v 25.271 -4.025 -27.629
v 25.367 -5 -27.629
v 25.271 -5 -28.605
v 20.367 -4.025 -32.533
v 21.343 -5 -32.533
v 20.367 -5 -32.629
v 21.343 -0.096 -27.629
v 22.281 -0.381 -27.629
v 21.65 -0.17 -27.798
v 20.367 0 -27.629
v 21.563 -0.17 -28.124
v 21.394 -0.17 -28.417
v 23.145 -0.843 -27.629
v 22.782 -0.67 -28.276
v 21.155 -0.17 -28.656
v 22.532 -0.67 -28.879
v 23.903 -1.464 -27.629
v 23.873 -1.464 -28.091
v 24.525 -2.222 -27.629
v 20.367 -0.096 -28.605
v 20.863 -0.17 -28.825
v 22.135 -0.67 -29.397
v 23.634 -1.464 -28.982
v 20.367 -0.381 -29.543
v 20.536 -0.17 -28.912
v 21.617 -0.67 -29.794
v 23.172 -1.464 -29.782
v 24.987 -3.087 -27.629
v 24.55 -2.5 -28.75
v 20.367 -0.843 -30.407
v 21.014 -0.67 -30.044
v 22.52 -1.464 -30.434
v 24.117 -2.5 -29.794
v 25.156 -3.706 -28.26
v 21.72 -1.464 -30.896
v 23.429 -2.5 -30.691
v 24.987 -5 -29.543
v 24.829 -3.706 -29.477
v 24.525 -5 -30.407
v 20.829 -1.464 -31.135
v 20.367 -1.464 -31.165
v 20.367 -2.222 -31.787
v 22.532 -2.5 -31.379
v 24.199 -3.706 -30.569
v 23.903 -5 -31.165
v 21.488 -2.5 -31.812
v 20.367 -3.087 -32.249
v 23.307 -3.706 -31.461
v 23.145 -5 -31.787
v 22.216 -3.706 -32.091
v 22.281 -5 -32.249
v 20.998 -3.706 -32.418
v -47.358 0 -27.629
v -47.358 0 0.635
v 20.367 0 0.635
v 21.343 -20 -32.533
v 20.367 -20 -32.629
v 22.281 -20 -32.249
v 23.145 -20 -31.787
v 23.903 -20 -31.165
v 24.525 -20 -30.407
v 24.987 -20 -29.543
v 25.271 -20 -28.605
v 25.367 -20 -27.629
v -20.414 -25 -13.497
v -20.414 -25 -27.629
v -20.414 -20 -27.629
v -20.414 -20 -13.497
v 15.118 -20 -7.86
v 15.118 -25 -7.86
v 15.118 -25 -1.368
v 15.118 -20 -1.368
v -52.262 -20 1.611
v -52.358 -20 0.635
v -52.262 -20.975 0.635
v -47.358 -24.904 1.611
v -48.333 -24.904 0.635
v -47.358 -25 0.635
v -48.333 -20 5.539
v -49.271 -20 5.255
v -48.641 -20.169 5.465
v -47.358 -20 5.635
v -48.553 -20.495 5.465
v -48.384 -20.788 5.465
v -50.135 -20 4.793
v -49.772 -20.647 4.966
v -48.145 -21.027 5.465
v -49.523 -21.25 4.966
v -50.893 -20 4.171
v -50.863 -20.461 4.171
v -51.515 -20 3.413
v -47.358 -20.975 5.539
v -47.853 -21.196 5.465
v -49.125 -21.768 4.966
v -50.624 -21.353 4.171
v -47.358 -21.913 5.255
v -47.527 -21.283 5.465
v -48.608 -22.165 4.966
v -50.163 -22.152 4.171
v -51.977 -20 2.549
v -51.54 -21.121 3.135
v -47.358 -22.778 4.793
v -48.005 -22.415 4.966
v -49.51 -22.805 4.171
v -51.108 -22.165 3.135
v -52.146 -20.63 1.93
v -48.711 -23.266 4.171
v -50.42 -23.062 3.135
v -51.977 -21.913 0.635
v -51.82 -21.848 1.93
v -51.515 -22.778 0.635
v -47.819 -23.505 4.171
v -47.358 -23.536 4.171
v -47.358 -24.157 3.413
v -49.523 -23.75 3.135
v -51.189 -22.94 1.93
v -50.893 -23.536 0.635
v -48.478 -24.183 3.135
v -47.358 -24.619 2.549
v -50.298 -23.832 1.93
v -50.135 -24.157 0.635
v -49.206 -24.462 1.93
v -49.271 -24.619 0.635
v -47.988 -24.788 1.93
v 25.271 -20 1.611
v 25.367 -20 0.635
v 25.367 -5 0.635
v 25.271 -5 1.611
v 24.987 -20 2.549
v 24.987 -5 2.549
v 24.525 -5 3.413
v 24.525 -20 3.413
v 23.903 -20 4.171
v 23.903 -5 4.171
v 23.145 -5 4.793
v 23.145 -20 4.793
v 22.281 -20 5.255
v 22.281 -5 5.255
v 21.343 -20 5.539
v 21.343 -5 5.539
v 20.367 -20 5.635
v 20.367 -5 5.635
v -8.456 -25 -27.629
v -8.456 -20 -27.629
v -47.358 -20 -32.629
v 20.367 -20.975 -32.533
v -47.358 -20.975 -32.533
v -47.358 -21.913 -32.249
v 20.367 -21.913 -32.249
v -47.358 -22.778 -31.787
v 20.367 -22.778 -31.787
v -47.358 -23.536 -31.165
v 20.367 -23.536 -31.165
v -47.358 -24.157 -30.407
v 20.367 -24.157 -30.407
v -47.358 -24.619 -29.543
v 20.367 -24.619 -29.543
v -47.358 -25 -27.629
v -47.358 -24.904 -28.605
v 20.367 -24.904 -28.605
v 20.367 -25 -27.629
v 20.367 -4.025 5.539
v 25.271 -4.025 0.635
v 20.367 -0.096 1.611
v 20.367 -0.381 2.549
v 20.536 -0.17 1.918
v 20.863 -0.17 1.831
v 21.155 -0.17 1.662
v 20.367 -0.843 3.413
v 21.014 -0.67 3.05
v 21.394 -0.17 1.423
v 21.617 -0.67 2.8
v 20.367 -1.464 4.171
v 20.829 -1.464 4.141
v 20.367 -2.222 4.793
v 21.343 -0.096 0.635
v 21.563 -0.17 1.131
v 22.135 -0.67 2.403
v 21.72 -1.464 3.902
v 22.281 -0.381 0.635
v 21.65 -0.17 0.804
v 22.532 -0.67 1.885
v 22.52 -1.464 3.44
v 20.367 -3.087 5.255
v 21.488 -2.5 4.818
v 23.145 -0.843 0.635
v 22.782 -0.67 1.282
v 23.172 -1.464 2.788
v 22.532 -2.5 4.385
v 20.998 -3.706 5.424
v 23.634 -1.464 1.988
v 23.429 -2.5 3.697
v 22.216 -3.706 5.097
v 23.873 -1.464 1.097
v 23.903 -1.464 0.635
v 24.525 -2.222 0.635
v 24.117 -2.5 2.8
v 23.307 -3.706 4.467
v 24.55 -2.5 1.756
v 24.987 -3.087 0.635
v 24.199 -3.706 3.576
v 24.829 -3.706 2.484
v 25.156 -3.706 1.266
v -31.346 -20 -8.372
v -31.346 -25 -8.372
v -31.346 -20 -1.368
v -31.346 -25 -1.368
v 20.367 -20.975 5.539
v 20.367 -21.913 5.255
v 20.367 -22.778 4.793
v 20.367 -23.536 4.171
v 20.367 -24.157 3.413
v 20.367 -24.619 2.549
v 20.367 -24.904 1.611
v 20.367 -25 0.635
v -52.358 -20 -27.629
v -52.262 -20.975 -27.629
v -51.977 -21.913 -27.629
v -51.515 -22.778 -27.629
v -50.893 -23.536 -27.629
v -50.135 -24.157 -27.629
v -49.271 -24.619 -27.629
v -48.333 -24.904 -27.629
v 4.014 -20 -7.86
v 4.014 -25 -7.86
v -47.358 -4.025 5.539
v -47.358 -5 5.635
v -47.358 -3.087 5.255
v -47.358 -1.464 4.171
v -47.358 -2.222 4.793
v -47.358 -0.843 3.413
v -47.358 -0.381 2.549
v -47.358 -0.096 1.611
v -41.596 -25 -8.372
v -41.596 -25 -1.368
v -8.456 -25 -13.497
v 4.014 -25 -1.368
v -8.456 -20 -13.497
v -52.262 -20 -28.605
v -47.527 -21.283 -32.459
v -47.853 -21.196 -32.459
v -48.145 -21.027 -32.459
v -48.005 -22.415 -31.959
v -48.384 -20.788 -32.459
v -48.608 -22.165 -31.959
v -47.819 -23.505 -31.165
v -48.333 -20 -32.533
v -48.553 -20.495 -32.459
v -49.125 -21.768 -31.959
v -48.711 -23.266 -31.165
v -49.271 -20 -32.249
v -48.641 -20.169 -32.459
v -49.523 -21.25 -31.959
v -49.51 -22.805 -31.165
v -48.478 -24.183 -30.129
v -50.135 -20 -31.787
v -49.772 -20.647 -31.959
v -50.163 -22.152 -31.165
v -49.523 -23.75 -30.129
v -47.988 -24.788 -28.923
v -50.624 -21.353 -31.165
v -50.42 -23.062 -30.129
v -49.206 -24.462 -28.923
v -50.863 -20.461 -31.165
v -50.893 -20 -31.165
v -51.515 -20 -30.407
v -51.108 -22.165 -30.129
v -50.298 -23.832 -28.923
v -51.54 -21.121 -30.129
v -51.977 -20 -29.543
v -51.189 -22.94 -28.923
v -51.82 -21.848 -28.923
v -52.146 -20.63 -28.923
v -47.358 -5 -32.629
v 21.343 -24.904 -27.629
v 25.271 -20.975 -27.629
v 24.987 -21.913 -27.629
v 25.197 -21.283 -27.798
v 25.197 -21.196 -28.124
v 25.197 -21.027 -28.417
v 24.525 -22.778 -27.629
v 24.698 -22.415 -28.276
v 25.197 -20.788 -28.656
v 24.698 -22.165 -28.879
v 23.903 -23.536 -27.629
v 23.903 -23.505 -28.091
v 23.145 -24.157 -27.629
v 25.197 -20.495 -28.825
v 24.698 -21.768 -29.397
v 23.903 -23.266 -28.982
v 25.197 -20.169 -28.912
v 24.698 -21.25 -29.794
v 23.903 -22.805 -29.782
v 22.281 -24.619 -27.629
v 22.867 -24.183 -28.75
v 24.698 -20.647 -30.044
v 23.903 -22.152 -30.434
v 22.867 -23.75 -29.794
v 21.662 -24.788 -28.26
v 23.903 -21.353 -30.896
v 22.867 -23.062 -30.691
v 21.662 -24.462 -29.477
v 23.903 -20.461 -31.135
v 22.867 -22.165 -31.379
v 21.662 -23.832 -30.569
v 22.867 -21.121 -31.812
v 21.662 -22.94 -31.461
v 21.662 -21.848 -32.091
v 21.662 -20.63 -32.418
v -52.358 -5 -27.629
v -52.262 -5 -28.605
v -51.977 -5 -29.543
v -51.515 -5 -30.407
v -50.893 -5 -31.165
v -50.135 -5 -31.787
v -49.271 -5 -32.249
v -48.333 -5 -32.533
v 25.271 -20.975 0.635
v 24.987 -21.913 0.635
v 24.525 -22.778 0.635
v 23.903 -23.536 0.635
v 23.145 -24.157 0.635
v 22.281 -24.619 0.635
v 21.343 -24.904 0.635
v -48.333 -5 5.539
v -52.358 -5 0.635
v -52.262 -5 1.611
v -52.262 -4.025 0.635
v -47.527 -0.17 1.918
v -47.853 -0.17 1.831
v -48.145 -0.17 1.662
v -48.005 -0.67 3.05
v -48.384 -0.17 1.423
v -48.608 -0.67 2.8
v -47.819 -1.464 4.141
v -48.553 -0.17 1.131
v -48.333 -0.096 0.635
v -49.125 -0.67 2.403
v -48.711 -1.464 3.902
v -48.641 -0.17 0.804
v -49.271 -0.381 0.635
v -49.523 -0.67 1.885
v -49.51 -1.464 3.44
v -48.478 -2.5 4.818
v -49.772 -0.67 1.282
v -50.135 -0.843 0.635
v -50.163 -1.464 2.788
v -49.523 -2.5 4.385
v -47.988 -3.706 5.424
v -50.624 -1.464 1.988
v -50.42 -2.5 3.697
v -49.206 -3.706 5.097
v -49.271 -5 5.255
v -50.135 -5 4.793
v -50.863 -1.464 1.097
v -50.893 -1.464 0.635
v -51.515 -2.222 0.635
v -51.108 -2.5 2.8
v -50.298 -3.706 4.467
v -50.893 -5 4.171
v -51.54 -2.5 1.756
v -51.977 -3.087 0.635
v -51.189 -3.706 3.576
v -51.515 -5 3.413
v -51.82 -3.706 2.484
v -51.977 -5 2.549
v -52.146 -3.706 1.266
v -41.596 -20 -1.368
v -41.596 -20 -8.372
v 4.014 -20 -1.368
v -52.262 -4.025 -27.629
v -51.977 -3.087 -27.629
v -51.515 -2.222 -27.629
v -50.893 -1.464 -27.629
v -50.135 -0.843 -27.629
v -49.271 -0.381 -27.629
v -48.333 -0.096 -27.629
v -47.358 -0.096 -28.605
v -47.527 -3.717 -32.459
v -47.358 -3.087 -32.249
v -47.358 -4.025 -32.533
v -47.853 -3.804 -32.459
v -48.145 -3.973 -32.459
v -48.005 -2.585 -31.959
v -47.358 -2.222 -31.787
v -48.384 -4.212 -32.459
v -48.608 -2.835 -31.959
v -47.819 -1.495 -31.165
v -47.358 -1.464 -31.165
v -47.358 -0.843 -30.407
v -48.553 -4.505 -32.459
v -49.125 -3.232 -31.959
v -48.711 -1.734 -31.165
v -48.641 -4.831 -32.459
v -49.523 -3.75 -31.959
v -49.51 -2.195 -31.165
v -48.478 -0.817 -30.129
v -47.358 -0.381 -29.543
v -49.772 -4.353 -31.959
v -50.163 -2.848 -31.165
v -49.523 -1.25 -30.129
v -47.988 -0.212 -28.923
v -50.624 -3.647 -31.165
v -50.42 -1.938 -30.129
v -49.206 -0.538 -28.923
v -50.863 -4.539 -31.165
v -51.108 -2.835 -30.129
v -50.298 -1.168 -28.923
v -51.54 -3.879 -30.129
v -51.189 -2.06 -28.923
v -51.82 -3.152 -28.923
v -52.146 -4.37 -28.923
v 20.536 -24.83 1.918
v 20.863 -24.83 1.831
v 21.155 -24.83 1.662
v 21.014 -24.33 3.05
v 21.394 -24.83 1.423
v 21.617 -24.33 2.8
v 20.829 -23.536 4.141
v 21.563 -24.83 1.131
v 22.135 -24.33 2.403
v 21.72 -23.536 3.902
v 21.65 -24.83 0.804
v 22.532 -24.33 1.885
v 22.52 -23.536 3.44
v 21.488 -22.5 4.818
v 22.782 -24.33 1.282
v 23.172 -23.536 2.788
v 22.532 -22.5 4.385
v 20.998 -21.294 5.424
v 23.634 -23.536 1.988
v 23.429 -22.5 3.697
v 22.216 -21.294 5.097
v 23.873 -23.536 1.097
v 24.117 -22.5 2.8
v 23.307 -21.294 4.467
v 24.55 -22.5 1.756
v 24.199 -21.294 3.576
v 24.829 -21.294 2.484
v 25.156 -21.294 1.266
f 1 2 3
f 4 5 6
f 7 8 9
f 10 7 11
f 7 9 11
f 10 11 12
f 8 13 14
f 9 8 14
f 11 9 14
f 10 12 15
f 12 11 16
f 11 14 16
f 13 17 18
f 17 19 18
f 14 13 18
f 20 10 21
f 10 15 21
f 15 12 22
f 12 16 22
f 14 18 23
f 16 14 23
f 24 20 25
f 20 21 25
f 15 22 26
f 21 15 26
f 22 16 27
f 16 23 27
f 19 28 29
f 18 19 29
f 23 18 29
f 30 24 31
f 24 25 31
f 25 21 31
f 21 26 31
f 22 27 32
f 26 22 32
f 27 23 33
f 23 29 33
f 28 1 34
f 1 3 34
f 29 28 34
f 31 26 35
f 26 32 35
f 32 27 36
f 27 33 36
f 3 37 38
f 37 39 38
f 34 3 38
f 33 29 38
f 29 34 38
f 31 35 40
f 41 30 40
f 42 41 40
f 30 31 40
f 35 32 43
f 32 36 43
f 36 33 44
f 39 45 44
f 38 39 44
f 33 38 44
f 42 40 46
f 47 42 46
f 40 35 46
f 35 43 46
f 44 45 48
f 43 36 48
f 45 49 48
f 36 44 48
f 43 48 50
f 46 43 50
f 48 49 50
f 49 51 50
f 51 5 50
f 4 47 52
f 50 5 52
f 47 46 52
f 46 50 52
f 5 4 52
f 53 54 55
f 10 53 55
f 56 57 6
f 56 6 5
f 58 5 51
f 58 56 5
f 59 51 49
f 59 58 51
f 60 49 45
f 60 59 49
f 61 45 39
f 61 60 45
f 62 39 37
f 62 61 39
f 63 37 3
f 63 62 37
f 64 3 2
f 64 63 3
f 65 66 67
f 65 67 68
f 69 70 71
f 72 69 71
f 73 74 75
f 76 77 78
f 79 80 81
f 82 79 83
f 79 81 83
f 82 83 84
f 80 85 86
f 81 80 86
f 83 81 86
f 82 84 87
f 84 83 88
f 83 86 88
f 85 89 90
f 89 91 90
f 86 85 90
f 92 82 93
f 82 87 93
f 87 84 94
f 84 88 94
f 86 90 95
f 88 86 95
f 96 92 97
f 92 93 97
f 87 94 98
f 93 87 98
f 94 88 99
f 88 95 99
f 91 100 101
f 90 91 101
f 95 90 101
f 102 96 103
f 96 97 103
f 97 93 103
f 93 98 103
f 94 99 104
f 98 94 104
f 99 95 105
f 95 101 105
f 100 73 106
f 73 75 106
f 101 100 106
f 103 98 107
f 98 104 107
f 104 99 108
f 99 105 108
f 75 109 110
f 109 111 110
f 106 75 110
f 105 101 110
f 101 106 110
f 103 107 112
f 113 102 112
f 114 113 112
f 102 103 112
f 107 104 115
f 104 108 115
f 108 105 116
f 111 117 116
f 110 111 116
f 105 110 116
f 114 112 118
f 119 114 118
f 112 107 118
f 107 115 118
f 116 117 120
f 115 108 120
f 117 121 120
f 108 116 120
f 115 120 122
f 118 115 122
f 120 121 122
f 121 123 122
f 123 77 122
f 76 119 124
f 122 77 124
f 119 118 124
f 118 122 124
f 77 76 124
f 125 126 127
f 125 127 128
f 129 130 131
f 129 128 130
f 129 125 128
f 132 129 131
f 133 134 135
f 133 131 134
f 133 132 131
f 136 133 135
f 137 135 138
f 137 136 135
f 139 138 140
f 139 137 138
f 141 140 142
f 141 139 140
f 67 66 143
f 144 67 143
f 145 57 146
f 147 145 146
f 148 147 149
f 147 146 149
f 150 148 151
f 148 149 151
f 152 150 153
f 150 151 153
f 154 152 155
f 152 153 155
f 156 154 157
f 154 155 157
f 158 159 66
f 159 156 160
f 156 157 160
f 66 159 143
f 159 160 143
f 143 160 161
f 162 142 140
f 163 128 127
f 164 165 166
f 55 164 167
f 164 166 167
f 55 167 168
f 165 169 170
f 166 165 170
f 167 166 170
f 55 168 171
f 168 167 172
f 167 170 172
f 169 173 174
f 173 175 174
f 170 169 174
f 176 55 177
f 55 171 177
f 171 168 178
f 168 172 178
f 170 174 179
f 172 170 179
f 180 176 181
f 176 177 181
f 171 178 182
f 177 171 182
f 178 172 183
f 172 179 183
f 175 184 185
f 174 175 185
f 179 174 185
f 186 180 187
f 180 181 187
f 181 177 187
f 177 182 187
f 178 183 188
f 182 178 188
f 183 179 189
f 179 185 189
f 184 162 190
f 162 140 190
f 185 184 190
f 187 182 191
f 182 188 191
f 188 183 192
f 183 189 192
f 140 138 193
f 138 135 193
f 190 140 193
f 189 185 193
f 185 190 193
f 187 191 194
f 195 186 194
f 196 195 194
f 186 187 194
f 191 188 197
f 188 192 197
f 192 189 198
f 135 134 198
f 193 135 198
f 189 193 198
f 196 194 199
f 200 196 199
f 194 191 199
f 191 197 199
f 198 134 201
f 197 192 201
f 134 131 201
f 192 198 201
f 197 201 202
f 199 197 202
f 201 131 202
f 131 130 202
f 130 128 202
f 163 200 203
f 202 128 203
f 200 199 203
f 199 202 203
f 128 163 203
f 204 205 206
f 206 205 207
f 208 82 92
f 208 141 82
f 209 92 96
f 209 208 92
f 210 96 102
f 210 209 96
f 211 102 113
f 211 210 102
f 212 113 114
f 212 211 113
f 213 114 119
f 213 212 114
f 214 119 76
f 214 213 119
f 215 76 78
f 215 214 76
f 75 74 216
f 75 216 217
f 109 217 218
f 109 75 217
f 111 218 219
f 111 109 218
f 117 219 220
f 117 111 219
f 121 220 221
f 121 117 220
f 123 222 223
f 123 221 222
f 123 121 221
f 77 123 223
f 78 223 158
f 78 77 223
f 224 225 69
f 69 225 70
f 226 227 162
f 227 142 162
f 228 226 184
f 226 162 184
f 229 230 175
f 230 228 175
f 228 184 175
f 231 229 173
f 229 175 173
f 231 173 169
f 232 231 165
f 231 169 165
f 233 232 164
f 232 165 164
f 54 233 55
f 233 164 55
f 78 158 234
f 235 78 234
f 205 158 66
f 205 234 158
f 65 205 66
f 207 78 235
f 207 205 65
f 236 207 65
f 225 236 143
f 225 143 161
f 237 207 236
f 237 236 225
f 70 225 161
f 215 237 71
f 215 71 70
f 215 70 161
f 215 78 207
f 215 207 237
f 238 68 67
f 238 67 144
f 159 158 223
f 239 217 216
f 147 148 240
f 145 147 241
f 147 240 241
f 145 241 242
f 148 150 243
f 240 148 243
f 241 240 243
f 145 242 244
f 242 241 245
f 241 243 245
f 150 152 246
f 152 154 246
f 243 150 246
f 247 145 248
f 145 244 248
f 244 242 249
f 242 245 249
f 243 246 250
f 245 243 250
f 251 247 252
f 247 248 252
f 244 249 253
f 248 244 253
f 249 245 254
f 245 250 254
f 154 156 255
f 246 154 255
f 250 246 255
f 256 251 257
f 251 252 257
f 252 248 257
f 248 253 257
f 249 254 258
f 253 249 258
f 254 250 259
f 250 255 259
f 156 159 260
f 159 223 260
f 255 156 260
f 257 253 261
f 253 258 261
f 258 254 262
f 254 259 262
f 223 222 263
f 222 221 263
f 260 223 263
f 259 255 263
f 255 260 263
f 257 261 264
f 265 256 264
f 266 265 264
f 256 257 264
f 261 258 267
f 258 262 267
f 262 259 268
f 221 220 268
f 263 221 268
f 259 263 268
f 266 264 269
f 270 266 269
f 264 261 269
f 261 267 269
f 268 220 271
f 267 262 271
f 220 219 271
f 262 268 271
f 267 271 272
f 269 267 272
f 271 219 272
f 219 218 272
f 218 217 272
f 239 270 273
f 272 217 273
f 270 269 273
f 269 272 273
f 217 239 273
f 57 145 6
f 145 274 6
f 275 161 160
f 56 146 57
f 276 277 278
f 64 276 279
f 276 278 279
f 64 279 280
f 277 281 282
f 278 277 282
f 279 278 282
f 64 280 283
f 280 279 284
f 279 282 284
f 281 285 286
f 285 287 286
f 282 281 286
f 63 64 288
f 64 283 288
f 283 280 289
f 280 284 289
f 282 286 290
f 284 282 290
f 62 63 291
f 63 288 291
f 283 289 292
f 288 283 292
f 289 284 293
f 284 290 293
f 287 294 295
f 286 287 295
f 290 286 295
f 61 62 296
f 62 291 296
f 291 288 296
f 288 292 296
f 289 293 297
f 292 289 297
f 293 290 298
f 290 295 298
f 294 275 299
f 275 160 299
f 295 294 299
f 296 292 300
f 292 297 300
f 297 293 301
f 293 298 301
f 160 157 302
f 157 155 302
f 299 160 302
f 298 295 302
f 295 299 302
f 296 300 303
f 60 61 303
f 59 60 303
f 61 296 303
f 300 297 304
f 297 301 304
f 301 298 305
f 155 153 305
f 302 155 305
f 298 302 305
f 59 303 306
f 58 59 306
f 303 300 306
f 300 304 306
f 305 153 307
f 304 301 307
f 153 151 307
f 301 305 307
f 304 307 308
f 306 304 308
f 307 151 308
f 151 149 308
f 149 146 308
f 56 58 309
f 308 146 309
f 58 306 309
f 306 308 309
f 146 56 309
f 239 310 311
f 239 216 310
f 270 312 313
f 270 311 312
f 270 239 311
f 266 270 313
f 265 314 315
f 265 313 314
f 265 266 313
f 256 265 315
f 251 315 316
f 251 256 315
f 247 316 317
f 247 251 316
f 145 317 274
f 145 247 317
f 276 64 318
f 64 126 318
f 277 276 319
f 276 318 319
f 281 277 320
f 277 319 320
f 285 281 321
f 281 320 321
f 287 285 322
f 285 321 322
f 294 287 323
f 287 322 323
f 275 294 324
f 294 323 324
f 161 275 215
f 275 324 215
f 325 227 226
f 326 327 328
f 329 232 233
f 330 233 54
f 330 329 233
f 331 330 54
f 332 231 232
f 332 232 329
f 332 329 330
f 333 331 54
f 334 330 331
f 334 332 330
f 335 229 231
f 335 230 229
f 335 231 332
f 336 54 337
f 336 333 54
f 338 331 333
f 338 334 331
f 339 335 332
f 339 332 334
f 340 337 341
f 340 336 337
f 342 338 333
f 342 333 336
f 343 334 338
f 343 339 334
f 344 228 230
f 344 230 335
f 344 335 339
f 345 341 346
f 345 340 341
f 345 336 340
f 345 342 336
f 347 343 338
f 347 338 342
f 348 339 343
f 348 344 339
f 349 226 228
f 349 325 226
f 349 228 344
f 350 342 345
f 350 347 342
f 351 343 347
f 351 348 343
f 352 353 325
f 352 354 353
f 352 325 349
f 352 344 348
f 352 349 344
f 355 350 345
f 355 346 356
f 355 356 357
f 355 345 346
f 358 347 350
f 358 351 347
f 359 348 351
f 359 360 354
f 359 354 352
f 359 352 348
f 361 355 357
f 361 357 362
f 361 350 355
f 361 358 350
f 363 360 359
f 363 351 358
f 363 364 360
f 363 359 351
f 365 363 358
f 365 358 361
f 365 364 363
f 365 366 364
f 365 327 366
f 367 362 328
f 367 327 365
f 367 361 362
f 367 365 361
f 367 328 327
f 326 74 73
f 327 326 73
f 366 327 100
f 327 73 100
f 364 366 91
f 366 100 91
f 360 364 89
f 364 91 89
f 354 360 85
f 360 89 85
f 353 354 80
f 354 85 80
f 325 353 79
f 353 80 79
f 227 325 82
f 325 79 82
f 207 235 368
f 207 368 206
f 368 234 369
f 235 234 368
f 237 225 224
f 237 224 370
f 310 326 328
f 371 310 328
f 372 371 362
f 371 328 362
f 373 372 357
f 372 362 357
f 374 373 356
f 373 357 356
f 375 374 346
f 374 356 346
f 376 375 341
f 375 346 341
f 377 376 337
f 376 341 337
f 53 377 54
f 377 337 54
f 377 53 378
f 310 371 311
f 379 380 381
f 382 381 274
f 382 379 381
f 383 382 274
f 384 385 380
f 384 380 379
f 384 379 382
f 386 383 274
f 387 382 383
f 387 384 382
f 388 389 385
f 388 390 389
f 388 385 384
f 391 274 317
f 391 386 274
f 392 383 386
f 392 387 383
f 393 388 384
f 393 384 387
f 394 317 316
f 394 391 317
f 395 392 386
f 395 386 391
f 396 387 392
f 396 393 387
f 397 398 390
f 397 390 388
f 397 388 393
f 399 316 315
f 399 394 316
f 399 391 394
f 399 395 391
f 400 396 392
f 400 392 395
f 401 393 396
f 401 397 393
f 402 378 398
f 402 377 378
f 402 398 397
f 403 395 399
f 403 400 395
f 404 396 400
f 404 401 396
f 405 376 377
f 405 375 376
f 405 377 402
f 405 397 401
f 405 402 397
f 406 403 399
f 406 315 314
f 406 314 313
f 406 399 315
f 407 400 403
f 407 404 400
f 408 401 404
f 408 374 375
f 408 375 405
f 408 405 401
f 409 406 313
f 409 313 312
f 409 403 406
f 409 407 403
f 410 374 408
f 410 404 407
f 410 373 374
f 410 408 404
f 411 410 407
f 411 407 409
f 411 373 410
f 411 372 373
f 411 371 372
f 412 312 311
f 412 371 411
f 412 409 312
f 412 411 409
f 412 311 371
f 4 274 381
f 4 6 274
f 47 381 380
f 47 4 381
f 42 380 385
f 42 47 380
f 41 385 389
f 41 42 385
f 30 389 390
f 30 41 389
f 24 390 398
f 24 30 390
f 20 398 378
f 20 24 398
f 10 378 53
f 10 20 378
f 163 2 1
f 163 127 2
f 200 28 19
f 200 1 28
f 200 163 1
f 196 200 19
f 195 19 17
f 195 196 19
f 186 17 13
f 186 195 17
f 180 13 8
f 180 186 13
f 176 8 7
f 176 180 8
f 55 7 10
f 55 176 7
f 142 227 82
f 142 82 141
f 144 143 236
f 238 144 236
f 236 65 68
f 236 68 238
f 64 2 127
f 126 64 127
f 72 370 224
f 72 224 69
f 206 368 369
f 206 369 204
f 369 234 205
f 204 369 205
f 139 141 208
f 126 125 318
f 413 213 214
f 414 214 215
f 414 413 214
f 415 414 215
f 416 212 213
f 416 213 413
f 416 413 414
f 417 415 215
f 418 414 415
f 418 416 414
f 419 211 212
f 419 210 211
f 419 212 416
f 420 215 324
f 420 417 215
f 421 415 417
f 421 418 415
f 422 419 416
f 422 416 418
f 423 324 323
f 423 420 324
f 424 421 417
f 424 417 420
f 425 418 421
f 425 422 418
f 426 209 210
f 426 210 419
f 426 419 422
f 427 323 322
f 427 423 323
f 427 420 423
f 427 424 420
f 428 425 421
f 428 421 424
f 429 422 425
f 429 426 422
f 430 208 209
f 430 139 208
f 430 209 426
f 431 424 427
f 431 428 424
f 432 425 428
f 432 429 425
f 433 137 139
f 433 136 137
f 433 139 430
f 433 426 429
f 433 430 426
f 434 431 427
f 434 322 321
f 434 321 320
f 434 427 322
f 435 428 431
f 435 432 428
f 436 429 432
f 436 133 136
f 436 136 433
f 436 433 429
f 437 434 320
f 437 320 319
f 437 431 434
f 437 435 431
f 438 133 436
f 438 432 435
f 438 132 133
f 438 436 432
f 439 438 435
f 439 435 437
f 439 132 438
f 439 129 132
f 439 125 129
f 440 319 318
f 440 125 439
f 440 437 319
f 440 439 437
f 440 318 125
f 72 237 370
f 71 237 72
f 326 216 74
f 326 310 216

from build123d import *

# Parameters (mm, degrees)
F0_W     = 77.725055
F0_H     = 38.264645
F1_DEPTH = 25
F2_R     = 5
F3_W     = 10.249458
F3_H     = 7.003797
F3_W_2   = 11.10358
F3_H_2   = 6.491324
F3_W_3   = 11.957702
F3_H_3   = 14.132324
F4_DEPTH = 5


with BuildPart() as f1:
    # F0 (on Front) → F1 (new body)
    with BuildSketch(Plane.XZ):
        with Locations((-13.49512, -13.496899)):
            Rectangle(F0_W, F0_H)
    extrude(amount=F1_DEPTH)

    # F2
    f2_edges = [f1.edges().sort_by_distance(p)[0] for p in [
        (-52.357648, -25, -13.496899),
        (25.367407, -12.5, 5.635423),
        (-52.357648, -12.5, 5.635423),
        (-13.49512, 0, 5.635423),
        (-13.49512, -25, 5.635423),
        (-13.49512, -25, -32.629222),
        (25.367407, -25, -13.496899),
        (25.367407, -12.5, -32.629222),
        (25.367407, 0, -13.496899),
        (-52.357648, 0, -13.496899),
        (-13.49512, 0, -32.629222),
        (-52.357648, -12.5, -32.629222),
    ]]
    fillet(f2_edges, radius=F2_R)

    # F3 (on face) → F4 (cut)
    with BuildSketch(Plane.XZ.offset(25)):
        with Locations((-36.470987, -4.870271)):
            Rectangle(F3_W, F3_H)
        with Locations((9.566161, -4.614035)):
            Rectangle(F3_W_2, F3_H_2)
        with Locations((-14.434654, -20.56306)):
            Rectangle(F3_W_3, F3_H_3)
    extrude(amount=-F4_DEPTH, mode=Mode.SUBTRACT)


solid = f1.part
